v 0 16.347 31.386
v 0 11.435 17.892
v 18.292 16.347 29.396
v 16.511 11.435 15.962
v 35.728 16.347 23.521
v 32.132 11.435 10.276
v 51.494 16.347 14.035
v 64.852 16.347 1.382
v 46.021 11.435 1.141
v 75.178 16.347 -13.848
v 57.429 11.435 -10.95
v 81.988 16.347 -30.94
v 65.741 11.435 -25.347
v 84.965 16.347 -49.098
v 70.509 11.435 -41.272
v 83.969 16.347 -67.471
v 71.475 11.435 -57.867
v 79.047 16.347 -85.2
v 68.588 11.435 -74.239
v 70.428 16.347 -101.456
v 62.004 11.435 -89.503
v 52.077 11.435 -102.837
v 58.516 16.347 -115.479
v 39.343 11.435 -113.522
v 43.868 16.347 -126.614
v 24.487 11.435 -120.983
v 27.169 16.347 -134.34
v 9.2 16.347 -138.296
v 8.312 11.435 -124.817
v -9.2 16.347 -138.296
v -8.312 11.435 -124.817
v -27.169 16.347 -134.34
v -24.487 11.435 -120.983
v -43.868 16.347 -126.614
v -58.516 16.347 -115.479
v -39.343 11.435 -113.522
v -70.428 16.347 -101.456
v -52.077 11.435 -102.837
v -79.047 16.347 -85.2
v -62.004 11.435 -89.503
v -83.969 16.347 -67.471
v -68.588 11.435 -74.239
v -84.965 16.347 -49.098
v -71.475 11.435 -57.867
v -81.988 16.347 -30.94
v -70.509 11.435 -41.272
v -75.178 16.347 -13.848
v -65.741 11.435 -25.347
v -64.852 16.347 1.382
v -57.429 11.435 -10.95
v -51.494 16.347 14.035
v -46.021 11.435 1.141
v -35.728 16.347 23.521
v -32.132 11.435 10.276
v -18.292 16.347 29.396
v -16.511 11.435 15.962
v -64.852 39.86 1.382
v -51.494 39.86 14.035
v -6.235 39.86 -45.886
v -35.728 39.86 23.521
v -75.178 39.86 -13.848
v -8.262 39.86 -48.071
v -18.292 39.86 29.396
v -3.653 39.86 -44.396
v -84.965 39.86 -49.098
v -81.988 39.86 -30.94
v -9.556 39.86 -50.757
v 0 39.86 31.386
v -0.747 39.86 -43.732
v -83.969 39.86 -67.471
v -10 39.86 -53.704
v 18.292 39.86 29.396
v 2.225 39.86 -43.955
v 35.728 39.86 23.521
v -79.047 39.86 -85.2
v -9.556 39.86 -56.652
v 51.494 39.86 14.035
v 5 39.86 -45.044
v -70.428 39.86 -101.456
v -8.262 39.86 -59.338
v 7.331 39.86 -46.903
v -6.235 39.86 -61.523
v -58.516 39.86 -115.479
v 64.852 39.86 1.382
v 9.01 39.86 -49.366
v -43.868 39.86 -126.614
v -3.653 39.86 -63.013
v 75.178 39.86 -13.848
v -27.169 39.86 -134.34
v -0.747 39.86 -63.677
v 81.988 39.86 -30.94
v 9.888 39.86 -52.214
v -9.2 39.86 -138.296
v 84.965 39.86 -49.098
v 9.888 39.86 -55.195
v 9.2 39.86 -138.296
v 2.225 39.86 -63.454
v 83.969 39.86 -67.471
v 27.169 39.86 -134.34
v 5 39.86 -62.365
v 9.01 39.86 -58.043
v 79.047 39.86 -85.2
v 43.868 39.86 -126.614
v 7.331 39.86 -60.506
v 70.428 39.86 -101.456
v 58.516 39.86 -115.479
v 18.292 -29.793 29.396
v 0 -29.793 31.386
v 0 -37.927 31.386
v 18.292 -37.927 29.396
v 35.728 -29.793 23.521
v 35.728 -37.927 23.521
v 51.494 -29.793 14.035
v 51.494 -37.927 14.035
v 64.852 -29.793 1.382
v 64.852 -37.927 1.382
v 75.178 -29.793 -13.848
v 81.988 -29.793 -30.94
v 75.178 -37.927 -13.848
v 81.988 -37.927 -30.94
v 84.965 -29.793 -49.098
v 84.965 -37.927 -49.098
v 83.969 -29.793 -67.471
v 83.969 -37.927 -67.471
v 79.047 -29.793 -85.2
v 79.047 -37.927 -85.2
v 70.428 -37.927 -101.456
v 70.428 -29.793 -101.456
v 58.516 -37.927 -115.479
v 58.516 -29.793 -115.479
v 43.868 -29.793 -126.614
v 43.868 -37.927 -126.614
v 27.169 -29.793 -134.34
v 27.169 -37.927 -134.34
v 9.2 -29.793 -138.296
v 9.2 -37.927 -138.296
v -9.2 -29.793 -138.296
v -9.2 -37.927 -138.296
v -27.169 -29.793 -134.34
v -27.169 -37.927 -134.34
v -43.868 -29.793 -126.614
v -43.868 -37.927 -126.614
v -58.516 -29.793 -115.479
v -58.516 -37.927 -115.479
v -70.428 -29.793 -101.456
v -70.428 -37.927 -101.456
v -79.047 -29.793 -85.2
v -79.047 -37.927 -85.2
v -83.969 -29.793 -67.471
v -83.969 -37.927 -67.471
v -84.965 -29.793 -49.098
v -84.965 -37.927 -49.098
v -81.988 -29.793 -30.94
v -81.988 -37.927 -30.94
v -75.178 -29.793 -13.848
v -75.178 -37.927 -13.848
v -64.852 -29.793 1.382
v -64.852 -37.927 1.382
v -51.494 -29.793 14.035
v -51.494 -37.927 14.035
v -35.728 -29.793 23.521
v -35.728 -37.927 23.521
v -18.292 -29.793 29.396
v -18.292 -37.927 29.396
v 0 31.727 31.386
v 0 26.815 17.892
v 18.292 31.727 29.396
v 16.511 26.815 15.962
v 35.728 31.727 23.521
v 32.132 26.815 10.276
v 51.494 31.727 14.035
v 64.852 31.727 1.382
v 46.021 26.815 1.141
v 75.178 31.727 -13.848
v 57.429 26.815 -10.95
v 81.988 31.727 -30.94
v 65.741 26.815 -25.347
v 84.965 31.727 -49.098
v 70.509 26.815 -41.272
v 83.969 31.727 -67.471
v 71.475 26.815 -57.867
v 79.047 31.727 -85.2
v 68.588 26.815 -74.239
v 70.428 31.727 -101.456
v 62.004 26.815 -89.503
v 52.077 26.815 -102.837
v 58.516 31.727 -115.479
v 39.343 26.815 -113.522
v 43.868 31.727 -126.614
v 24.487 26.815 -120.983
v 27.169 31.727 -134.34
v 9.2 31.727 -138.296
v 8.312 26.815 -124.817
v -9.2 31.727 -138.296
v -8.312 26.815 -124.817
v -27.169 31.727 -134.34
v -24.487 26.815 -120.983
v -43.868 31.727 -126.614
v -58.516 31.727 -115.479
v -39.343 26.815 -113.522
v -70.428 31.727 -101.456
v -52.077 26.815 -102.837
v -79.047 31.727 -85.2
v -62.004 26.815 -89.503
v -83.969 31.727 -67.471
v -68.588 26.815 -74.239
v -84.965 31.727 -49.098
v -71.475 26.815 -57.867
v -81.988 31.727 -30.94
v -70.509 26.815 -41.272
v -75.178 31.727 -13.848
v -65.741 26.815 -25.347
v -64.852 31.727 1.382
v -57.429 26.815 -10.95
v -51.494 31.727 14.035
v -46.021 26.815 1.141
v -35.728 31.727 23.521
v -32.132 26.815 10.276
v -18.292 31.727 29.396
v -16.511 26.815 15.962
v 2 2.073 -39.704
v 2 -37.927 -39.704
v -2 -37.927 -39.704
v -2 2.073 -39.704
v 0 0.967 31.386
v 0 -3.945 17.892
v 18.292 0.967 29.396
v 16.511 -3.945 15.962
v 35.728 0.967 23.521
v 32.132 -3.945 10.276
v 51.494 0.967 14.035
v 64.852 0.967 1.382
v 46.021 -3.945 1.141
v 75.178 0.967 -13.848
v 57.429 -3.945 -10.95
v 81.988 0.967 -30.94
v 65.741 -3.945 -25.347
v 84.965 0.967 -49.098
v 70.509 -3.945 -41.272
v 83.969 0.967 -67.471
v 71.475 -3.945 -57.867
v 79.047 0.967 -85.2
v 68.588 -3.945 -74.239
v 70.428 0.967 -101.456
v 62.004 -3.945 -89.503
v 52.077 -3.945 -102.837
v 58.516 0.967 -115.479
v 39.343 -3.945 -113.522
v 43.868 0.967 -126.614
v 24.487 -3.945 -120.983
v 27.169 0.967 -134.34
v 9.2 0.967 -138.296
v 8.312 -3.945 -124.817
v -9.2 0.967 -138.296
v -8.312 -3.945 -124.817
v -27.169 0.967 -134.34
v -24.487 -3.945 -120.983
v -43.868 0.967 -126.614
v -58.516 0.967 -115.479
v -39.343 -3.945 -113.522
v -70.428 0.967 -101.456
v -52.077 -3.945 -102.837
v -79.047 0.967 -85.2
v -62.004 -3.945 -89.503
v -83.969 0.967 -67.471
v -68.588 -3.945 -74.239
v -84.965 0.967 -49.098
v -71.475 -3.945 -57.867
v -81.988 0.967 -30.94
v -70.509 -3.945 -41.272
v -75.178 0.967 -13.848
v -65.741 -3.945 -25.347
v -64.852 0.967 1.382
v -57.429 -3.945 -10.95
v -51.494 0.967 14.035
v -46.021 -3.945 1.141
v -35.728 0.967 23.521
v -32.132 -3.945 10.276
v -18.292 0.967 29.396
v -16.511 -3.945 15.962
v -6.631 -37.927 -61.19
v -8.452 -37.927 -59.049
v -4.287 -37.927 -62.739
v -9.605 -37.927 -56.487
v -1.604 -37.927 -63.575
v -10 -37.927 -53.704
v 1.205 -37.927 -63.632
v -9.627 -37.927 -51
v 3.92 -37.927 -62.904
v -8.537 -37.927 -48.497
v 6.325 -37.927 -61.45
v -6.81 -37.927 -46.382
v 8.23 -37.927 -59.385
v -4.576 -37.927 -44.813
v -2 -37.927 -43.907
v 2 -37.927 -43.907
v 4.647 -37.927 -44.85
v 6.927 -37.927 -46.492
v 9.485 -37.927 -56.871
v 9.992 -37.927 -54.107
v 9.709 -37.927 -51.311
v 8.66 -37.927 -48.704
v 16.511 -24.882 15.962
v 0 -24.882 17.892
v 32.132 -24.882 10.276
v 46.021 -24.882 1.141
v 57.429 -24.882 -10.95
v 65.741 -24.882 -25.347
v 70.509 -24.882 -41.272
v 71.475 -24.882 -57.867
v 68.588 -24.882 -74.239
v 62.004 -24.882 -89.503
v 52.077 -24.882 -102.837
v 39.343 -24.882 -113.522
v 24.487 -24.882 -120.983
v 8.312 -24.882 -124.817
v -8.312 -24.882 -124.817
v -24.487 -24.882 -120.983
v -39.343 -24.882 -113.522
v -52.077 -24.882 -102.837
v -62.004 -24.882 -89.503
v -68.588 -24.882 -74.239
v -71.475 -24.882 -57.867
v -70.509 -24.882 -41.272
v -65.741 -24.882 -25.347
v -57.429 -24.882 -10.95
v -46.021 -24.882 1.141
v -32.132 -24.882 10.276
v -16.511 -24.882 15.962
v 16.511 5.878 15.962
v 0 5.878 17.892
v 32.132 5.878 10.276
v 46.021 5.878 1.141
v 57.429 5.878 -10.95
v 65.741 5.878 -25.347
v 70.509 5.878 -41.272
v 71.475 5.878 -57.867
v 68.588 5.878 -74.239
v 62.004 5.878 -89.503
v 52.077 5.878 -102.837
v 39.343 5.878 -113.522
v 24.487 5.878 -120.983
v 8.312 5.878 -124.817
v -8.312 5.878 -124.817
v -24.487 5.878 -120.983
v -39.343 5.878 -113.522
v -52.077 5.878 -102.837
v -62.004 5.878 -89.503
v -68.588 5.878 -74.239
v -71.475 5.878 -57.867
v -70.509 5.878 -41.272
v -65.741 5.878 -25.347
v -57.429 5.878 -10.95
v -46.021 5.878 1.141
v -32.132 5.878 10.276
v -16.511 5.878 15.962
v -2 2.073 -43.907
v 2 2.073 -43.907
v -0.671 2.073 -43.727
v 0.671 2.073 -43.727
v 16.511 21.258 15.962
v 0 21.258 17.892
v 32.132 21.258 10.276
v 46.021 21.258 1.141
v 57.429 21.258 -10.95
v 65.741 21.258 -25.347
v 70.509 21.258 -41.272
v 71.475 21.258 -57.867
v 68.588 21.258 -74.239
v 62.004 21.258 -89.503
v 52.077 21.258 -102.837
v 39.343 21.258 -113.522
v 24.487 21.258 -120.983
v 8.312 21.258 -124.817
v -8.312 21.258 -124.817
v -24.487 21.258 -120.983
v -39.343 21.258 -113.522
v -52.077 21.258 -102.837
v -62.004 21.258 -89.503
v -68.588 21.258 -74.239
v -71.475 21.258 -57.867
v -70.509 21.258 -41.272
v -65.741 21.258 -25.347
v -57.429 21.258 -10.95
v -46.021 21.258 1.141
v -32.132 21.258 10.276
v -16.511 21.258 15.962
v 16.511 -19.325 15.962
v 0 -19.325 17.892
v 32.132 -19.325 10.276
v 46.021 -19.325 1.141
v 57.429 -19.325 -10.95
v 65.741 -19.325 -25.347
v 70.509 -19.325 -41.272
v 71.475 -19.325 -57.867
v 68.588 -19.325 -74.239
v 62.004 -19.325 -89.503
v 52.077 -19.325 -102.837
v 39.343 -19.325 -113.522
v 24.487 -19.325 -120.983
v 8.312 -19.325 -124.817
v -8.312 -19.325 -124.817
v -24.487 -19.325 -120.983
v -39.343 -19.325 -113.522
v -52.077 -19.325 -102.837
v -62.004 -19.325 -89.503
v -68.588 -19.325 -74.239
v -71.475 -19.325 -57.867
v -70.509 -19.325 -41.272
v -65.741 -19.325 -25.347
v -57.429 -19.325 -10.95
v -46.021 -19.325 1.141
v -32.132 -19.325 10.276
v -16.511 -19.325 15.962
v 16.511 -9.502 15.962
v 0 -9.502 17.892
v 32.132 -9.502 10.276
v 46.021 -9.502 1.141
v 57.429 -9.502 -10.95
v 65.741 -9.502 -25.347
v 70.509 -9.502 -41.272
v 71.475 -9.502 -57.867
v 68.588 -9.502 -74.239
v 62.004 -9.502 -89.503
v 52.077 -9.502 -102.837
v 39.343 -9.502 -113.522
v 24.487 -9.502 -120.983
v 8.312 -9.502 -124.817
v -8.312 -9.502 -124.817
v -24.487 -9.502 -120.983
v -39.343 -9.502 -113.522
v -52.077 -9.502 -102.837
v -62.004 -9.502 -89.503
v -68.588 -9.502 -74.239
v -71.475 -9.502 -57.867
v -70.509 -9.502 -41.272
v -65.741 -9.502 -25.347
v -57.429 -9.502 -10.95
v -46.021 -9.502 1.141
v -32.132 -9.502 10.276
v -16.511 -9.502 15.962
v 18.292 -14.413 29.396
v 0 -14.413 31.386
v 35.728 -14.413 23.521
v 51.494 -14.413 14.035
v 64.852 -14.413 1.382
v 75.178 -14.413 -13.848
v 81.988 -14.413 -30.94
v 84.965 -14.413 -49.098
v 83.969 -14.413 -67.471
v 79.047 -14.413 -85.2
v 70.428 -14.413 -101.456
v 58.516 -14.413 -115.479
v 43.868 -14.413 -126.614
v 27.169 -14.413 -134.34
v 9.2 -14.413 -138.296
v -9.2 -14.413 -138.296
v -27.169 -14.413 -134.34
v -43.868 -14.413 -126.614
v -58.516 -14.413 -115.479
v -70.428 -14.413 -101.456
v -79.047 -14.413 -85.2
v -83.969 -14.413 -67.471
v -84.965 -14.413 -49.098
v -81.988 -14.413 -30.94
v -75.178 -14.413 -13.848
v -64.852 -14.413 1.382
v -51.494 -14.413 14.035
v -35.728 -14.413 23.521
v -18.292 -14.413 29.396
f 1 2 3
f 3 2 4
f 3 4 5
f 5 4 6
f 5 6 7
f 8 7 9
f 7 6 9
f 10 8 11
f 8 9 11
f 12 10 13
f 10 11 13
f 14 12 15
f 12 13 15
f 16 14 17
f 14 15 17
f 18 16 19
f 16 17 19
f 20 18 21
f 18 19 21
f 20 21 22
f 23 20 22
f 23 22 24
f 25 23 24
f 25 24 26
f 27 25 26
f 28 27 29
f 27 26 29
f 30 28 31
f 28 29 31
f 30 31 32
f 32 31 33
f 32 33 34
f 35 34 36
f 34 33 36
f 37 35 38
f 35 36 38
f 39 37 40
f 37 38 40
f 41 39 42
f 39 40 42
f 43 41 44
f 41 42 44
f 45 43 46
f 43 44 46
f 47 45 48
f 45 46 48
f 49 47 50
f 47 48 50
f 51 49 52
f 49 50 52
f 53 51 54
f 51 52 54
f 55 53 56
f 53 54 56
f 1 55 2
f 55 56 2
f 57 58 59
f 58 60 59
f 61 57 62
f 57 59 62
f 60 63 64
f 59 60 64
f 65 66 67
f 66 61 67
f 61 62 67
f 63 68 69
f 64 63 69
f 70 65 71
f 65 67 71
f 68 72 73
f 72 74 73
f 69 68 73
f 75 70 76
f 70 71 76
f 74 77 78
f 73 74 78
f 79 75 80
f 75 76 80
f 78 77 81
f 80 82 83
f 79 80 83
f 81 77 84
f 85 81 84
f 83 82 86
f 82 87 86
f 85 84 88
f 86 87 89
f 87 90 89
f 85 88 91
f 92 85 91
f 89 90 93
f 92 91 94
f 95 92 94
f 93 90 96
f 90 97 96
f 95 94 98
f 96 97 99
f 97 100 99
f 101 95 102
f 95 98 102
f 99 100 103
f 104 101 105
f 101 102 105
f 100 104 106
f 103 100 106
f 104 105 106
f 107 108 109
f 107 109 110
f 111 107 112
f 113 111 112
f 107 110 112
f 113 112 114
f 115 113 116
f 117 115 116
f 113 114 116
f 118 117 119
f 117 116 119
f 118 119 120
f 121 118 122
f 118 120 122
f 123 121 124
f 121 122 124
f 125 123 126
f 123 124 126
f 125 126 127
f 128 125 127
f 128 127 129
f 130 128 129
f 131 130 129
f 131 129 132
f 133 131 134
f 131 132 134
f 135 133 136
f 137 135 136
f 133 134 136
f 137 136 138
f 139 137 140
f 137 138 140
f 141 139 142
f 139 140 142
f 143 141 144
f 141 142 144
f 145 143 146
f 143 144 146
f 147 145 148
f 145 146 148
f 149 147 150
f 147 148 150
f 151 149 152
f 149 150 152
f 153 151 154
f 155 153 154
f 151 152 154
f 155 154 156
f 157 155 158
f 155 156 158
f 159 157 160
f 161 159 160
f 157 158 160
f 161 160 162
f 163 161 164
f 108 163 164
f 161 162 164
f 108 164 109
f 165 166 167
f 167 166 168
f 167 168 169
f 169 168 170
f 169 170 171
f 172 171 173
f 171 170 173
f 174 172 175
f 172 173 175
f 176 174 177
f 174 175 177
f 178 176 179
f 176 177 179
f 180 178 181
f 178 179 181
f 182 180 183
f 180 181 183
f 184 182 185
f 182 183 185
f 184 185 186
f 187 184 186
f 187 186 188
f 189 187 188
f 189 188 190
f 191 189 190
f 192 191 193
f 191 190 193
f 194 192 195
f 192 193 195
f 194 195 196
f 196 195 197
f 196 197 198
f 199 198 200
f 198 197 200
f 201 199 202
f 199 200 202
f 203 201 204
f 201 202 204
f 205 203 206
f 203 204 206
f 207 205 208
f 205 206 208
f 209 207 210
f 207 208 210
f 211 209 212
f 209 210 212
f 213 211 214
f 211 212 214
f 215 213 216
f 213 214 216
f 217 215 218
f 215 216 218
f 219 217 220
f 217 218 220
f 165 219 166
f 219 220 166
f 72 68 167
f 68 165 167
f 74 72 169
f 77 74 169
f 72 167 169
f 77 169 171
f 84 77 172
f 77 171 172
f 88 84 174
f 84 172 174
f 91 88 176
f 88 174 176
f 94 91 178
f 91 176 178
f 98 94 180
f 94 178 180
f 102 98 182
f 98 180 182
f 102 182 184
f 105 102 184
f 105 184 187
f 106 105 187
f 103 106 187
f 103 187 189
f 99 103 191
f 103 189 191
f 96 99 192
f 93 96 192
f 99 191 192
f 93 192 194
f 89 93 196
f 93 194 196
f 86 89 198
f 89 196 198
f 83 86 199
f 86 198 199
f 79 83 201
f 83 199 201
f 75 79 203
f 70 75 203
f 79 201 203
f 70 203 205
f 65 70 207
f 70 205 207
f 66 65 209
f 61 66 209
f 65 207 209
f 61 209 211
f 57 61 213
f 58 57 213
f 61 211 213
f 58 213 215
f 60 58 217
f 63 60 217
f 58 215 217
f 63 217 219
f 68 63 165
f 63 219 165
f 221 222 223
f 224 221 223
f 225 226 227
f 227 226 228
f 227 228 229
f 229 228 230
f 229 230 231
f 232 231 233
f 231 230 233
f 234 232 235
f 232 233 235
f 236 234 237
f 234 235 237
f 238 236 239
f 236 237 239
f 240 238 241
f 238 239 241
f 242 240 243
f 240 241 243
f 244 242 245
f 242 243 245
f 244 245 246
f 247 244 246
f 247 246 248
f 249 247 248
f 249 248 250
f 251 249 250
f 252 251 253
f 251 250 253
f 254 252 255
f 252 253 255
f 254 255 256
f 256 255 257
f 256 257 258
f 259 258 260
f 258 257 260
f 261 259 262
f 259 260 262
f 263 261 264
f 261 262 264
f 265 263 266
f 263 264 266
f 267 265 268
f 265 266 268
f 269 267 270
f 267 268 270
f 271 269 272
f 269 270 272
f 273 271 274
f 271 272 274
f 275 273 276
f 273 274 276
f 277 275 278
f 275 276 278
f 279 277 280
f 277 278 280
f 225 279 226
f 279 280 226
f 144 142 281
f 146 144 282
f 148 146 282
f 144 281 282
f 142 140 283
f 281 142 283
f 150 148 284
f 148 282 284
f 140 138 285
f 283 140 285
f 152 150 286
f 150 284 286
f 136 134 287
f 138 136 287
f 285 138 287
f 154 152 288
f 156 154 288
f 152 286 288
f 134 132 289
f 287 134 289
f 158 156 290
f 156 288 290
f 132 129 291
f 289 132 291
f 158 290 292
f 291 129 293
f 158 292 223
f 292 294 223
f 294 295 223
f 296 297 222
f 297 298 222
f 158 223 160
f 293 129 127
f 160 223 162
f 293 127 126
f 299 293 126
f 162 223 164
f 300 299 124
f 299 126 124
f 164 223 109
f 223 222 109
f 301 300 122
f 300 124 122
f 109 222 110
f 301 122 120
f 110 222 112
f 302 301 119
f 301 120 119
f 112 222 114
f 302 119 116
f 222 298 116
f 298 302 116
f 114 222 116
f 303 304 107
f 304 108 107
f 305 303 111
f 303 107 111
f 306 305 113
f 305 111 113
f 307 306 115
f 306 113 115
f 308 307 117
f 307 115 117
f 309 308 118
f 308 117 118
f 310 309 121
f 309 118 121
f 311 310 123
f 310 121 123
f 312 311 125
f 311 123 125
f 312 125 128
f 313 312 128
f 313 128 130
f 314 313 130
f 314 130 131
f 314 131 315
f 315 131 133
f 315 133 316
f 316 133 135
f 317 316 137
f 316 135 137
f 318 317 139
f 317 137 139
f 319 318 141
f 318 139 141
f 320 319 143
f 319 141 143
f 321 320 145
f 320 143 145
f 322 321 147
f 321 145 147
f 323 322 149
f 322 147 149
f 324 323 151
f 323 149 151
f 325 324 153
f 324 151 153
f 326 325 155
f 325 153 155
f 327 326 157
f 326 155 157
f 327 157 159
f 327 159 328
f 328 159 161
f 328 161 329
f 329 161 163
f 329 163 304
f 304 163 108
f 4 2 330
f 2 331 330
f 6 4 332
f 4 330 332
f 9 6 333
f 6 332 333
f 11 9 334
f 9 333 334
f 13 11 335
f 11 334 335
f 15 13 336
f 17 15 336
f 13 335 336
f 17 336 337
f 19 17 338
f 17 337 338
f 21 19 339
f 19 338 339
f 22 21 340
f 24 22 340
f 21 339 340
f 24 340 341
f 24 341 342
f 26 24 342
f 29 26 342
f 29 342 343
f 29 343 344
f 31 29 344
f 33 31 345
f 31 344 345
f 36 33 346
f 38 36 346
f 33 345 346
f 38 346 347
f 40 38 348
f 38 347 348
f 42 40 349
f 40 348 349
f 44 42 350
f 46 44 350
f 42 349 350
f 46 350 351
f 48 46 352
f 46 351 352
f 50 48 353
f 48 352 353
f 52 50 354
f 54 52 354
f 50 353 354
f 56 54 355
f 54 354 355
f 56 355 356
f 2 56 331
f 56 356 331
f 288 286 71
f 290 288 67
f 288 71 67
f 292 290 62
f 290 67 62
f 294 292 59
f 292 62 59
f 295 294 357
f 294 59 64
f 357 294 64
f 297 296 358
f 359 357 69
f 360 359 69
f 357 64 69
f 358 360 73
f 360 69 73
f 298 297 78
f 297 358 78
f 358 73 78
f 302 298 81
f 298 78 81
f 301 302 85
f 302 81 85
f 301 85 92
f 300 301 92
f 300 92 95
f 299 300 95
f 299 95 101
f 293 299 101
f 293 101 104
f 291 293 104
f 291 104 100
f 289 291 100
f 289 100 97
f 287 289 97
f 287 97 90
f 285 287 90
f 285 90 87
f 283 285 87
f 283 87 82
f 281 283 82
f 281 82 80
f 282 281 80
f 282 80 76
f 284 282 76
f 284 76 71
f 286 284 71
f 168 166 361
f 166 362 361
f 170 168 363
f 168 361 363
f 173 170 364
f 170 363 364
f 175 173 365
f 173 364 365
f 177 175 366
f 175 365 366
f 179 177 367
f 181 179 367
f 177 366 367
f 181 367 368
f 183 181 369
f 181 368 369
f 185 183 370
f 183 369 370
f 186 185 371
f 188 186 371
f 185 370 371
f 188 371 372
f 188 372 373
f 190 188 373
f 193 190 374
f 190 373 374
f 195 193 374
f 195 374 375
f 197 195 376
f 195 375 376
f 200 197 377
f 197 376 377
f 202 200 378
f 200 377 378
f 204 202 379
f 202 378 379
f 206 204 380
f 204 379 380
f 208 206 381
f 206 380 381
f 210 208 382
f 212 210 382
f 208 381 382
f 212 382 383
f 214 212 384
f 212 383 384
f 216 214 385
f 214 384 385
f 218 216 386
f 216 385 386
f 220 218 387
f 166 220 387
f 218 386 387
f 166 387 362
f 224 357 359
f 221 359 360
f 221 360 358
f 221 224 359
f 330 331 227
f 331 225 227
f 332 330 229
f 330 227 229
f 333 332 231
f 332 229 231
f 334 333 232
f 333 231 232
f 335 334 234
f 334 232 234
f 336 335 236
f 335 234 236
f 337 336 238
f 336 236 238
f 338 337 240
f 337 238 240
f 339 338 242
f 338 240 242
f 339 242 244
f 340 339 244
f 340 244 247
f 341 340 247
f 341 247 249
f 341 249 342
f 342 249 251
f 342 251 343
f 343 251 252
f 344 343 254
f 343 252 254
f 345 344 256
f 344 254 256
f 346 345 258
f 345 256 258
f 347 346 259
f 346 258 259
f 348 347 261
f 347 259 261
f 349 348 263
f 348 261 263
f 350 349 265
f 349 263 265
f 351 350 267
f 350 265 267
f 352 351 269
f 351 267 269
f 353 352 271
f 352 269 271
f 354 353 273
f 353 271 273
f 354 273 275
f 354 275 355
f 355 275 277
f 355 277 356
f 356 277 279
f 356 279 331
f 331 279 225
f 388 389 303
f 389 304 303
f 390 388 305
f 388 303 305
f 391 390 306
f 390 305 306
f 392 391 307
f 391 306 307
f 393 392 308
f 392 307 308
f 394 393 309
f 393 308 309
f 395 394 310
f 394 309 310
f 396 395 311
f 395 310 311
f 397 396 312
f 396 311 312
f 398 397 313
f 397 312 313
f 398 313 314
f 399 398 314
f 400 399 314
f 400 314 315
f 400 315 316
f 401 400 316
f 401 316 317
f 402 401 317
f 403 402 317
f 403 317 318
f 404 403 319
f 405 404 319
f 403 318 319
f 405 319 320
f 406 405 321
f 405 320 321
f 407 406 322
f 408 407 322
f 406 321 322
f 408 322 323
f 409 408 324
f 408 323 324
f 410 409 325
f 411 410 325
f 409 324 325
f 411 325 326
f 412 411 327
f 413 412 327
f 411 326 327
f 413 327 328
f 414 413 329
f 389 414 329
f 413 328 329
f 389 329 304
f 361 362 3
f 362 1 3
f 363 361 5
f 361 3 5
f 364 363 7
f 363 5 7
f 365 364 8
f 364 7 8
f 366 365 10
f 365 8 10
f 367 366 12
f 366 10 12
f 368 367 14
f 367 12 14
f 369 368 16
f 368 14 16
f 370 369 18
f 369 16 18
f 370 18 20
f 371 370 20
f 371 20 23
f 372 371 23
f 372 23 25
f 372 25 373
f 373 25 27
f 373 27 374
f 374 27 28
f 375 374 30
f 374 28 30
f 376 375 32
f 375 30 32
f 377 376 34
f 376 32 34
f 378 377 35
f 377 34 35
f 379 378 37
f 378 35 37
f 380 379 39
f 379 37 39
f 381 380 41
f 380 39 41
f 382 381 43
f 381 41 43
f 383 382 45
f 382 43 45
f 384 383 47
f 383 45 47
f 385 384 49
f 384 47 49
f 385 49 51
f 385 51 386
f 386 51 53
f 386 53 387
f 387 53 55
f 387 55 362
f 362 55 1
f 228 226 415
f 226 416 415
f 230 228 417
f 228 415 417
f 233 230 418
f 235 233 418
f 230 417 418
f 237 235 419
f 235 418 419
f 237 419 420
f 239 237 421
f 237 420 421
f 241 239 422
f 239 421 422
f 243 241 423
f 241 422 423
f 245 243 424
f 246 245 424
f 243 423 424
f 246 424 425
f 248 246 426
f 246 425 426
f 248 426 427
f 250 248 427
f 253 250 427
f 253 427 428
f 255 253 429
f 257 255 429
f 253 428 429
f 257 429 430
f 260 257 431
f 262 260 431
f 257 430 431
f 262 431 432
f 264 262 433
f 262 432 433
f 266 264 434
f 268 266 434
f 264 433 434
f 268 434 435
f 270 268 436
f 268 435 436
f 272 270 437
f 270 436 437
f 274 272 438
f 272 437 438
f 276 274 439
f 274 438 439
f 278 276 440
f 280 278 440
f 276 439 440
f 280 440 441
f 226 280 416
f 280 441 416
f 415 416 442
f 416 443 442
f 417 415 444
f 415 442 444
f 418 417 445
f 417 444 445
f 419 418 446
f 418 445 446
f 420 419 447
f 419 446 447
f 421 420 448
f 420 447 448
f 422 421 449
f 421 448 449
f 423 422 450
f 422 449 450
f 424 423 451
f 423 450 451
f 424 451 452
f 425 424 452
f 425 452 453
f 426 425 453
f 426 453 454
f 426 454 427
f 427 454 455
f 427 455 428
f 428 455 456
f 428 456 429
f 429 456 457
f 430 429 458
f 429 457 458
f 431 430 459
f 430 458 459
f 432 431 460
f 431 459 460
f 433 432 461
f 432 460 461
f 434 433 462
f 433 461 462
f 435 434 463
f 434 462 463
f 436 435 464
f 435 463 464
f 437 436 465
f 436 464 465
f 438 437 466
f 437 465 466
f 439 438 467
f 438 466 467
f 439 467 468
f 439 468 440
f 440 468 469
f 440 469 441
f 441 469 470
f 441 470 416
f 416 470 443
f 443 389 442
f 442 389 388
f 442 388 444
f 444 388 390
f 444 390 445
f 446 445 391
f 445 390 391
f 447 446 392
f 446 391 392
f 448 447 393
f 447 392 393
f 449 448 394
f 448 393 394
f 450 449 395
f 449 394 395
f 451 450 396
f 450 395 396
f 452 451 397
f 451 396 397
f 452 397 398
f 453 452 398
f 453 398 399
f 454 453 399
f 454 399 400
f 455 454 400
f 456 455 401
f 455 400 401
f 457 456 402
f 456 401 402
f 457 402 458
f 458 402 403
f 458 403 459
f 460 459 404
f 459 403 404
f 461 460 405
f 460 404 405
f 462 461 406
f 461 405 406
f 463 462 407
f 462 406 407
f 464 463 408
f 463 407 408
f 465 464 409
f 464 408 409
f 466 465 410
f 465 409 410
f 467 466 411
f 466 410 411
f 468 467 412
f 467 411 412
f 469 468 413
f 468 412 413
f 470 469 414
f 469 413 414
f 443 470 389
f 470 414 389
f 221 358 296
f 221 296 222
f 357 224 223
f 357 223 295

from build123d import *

# Parameters (mm, degrees)
F2_R     = 10
F3_DEPTH = 77.978
F5_DEPTH = 40


# Not quite as in the source:
# - ends of sketch curves that miss each other by under 0.0002 mm in the source are joined


with BuildPart() as f1:
    # F0 (on Right) → F1 (revolve)
    with BuildSketch(Plane.YZ):
        Polygon((-29.7933634734, 31.385529514), (-37.9271134734, 31.385529514), (-37.9271134734, -53.704470486), (-29.7933634734, -53.704470486), (31.7266365266, -53.704470486), (39.8603865266, -53.704470486), (39.8603865266, 31.385529514), (31.7266365266, 31.385529514), (26.815313074, 17.891779514), (21.2579597972, 17.891779514), (16.3466364486, 31.385529514), (11.4353131, 17.891779514), (5.8779598232, 17.891779514), (0.9666364746, 31.385529514), (-3.944686874, 17.891779514), (-9.5020401508, 17.891779514), (-14.4133634994, 31.385529514), (-19.324686848, 17.891779514), (-24.8820401248, 17.891779514), align=None)
    revolve(axis=Axis((0, 0.9666365266, -53.704470486), (0, 1, 0)))

    # F2 (on face) → F3 (cut)
    with BuildSketch(Plane(origin=(0, 39.8603865266, 0), x_dir=(-1, 0, 0), z_dir=(0, 1, 0))):
        with Locations((0, -53.704470486)):
            Circle(F2_R)
    extrude(amount=-F3_DEPTH, mode=Mode.SUBTRACT)

    # F4 (on face) → F5 (cut)
    with BuildSketch(Plane.XZ.offset(37.9271134734)):
        with BuildLine():
            Line((2, -39.704470486), (0, -39.704470486))
            Line((0, -39.704470486), (-2, -39.704470486))
            Line((-2, -39.704470486), (-2, -43.9065115149))
            ThreePointArc((-2, -43.9065115149), (0, -43.704470486), (2, -43.9065115149))
            Line((2, -43.9065115149), (2, -39.704470486))
        make_face()
    extrude(amount=-F5_DEPTH, mode=Mode.SUBTRACT)


solid = f1.part
